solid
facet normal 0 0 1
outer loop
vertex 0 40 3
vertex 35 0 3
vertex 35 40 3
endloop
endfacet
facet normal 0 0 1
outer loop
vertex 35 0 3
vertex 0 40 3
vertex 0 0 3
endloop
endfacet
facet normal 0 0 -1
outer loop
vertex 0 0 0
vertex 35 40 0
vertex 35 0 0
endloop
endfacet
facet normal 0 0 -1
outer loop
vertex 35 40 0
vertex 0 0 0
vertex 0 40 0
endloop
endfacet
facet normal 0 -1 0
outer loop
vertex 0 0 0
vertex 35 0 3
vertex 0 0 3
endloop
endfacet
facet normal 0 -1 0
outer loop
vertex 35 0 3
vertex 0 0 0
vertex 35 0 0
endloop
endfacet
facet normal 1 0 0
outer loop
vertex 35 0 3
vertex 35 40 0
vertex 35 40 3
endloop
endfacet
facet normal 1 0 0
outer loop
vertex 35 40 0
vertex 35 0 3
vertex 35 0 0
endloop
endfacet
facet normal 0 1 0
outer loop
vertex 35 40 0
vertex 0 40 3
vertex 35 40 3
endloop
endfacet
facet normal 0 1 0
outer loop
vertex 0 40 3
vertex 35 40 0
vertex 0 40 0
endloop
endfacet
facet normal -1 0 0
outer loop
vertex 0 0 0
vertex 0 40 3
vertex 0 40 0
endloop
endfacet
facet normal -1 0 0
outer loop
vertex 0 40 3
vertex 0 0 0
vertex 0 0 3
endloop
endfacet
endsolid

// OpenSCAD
$fn=360;
//67x93x22
x=35;
y=40;
z=3;
  translate([0,0,0])
  cube([x,y,z]);
